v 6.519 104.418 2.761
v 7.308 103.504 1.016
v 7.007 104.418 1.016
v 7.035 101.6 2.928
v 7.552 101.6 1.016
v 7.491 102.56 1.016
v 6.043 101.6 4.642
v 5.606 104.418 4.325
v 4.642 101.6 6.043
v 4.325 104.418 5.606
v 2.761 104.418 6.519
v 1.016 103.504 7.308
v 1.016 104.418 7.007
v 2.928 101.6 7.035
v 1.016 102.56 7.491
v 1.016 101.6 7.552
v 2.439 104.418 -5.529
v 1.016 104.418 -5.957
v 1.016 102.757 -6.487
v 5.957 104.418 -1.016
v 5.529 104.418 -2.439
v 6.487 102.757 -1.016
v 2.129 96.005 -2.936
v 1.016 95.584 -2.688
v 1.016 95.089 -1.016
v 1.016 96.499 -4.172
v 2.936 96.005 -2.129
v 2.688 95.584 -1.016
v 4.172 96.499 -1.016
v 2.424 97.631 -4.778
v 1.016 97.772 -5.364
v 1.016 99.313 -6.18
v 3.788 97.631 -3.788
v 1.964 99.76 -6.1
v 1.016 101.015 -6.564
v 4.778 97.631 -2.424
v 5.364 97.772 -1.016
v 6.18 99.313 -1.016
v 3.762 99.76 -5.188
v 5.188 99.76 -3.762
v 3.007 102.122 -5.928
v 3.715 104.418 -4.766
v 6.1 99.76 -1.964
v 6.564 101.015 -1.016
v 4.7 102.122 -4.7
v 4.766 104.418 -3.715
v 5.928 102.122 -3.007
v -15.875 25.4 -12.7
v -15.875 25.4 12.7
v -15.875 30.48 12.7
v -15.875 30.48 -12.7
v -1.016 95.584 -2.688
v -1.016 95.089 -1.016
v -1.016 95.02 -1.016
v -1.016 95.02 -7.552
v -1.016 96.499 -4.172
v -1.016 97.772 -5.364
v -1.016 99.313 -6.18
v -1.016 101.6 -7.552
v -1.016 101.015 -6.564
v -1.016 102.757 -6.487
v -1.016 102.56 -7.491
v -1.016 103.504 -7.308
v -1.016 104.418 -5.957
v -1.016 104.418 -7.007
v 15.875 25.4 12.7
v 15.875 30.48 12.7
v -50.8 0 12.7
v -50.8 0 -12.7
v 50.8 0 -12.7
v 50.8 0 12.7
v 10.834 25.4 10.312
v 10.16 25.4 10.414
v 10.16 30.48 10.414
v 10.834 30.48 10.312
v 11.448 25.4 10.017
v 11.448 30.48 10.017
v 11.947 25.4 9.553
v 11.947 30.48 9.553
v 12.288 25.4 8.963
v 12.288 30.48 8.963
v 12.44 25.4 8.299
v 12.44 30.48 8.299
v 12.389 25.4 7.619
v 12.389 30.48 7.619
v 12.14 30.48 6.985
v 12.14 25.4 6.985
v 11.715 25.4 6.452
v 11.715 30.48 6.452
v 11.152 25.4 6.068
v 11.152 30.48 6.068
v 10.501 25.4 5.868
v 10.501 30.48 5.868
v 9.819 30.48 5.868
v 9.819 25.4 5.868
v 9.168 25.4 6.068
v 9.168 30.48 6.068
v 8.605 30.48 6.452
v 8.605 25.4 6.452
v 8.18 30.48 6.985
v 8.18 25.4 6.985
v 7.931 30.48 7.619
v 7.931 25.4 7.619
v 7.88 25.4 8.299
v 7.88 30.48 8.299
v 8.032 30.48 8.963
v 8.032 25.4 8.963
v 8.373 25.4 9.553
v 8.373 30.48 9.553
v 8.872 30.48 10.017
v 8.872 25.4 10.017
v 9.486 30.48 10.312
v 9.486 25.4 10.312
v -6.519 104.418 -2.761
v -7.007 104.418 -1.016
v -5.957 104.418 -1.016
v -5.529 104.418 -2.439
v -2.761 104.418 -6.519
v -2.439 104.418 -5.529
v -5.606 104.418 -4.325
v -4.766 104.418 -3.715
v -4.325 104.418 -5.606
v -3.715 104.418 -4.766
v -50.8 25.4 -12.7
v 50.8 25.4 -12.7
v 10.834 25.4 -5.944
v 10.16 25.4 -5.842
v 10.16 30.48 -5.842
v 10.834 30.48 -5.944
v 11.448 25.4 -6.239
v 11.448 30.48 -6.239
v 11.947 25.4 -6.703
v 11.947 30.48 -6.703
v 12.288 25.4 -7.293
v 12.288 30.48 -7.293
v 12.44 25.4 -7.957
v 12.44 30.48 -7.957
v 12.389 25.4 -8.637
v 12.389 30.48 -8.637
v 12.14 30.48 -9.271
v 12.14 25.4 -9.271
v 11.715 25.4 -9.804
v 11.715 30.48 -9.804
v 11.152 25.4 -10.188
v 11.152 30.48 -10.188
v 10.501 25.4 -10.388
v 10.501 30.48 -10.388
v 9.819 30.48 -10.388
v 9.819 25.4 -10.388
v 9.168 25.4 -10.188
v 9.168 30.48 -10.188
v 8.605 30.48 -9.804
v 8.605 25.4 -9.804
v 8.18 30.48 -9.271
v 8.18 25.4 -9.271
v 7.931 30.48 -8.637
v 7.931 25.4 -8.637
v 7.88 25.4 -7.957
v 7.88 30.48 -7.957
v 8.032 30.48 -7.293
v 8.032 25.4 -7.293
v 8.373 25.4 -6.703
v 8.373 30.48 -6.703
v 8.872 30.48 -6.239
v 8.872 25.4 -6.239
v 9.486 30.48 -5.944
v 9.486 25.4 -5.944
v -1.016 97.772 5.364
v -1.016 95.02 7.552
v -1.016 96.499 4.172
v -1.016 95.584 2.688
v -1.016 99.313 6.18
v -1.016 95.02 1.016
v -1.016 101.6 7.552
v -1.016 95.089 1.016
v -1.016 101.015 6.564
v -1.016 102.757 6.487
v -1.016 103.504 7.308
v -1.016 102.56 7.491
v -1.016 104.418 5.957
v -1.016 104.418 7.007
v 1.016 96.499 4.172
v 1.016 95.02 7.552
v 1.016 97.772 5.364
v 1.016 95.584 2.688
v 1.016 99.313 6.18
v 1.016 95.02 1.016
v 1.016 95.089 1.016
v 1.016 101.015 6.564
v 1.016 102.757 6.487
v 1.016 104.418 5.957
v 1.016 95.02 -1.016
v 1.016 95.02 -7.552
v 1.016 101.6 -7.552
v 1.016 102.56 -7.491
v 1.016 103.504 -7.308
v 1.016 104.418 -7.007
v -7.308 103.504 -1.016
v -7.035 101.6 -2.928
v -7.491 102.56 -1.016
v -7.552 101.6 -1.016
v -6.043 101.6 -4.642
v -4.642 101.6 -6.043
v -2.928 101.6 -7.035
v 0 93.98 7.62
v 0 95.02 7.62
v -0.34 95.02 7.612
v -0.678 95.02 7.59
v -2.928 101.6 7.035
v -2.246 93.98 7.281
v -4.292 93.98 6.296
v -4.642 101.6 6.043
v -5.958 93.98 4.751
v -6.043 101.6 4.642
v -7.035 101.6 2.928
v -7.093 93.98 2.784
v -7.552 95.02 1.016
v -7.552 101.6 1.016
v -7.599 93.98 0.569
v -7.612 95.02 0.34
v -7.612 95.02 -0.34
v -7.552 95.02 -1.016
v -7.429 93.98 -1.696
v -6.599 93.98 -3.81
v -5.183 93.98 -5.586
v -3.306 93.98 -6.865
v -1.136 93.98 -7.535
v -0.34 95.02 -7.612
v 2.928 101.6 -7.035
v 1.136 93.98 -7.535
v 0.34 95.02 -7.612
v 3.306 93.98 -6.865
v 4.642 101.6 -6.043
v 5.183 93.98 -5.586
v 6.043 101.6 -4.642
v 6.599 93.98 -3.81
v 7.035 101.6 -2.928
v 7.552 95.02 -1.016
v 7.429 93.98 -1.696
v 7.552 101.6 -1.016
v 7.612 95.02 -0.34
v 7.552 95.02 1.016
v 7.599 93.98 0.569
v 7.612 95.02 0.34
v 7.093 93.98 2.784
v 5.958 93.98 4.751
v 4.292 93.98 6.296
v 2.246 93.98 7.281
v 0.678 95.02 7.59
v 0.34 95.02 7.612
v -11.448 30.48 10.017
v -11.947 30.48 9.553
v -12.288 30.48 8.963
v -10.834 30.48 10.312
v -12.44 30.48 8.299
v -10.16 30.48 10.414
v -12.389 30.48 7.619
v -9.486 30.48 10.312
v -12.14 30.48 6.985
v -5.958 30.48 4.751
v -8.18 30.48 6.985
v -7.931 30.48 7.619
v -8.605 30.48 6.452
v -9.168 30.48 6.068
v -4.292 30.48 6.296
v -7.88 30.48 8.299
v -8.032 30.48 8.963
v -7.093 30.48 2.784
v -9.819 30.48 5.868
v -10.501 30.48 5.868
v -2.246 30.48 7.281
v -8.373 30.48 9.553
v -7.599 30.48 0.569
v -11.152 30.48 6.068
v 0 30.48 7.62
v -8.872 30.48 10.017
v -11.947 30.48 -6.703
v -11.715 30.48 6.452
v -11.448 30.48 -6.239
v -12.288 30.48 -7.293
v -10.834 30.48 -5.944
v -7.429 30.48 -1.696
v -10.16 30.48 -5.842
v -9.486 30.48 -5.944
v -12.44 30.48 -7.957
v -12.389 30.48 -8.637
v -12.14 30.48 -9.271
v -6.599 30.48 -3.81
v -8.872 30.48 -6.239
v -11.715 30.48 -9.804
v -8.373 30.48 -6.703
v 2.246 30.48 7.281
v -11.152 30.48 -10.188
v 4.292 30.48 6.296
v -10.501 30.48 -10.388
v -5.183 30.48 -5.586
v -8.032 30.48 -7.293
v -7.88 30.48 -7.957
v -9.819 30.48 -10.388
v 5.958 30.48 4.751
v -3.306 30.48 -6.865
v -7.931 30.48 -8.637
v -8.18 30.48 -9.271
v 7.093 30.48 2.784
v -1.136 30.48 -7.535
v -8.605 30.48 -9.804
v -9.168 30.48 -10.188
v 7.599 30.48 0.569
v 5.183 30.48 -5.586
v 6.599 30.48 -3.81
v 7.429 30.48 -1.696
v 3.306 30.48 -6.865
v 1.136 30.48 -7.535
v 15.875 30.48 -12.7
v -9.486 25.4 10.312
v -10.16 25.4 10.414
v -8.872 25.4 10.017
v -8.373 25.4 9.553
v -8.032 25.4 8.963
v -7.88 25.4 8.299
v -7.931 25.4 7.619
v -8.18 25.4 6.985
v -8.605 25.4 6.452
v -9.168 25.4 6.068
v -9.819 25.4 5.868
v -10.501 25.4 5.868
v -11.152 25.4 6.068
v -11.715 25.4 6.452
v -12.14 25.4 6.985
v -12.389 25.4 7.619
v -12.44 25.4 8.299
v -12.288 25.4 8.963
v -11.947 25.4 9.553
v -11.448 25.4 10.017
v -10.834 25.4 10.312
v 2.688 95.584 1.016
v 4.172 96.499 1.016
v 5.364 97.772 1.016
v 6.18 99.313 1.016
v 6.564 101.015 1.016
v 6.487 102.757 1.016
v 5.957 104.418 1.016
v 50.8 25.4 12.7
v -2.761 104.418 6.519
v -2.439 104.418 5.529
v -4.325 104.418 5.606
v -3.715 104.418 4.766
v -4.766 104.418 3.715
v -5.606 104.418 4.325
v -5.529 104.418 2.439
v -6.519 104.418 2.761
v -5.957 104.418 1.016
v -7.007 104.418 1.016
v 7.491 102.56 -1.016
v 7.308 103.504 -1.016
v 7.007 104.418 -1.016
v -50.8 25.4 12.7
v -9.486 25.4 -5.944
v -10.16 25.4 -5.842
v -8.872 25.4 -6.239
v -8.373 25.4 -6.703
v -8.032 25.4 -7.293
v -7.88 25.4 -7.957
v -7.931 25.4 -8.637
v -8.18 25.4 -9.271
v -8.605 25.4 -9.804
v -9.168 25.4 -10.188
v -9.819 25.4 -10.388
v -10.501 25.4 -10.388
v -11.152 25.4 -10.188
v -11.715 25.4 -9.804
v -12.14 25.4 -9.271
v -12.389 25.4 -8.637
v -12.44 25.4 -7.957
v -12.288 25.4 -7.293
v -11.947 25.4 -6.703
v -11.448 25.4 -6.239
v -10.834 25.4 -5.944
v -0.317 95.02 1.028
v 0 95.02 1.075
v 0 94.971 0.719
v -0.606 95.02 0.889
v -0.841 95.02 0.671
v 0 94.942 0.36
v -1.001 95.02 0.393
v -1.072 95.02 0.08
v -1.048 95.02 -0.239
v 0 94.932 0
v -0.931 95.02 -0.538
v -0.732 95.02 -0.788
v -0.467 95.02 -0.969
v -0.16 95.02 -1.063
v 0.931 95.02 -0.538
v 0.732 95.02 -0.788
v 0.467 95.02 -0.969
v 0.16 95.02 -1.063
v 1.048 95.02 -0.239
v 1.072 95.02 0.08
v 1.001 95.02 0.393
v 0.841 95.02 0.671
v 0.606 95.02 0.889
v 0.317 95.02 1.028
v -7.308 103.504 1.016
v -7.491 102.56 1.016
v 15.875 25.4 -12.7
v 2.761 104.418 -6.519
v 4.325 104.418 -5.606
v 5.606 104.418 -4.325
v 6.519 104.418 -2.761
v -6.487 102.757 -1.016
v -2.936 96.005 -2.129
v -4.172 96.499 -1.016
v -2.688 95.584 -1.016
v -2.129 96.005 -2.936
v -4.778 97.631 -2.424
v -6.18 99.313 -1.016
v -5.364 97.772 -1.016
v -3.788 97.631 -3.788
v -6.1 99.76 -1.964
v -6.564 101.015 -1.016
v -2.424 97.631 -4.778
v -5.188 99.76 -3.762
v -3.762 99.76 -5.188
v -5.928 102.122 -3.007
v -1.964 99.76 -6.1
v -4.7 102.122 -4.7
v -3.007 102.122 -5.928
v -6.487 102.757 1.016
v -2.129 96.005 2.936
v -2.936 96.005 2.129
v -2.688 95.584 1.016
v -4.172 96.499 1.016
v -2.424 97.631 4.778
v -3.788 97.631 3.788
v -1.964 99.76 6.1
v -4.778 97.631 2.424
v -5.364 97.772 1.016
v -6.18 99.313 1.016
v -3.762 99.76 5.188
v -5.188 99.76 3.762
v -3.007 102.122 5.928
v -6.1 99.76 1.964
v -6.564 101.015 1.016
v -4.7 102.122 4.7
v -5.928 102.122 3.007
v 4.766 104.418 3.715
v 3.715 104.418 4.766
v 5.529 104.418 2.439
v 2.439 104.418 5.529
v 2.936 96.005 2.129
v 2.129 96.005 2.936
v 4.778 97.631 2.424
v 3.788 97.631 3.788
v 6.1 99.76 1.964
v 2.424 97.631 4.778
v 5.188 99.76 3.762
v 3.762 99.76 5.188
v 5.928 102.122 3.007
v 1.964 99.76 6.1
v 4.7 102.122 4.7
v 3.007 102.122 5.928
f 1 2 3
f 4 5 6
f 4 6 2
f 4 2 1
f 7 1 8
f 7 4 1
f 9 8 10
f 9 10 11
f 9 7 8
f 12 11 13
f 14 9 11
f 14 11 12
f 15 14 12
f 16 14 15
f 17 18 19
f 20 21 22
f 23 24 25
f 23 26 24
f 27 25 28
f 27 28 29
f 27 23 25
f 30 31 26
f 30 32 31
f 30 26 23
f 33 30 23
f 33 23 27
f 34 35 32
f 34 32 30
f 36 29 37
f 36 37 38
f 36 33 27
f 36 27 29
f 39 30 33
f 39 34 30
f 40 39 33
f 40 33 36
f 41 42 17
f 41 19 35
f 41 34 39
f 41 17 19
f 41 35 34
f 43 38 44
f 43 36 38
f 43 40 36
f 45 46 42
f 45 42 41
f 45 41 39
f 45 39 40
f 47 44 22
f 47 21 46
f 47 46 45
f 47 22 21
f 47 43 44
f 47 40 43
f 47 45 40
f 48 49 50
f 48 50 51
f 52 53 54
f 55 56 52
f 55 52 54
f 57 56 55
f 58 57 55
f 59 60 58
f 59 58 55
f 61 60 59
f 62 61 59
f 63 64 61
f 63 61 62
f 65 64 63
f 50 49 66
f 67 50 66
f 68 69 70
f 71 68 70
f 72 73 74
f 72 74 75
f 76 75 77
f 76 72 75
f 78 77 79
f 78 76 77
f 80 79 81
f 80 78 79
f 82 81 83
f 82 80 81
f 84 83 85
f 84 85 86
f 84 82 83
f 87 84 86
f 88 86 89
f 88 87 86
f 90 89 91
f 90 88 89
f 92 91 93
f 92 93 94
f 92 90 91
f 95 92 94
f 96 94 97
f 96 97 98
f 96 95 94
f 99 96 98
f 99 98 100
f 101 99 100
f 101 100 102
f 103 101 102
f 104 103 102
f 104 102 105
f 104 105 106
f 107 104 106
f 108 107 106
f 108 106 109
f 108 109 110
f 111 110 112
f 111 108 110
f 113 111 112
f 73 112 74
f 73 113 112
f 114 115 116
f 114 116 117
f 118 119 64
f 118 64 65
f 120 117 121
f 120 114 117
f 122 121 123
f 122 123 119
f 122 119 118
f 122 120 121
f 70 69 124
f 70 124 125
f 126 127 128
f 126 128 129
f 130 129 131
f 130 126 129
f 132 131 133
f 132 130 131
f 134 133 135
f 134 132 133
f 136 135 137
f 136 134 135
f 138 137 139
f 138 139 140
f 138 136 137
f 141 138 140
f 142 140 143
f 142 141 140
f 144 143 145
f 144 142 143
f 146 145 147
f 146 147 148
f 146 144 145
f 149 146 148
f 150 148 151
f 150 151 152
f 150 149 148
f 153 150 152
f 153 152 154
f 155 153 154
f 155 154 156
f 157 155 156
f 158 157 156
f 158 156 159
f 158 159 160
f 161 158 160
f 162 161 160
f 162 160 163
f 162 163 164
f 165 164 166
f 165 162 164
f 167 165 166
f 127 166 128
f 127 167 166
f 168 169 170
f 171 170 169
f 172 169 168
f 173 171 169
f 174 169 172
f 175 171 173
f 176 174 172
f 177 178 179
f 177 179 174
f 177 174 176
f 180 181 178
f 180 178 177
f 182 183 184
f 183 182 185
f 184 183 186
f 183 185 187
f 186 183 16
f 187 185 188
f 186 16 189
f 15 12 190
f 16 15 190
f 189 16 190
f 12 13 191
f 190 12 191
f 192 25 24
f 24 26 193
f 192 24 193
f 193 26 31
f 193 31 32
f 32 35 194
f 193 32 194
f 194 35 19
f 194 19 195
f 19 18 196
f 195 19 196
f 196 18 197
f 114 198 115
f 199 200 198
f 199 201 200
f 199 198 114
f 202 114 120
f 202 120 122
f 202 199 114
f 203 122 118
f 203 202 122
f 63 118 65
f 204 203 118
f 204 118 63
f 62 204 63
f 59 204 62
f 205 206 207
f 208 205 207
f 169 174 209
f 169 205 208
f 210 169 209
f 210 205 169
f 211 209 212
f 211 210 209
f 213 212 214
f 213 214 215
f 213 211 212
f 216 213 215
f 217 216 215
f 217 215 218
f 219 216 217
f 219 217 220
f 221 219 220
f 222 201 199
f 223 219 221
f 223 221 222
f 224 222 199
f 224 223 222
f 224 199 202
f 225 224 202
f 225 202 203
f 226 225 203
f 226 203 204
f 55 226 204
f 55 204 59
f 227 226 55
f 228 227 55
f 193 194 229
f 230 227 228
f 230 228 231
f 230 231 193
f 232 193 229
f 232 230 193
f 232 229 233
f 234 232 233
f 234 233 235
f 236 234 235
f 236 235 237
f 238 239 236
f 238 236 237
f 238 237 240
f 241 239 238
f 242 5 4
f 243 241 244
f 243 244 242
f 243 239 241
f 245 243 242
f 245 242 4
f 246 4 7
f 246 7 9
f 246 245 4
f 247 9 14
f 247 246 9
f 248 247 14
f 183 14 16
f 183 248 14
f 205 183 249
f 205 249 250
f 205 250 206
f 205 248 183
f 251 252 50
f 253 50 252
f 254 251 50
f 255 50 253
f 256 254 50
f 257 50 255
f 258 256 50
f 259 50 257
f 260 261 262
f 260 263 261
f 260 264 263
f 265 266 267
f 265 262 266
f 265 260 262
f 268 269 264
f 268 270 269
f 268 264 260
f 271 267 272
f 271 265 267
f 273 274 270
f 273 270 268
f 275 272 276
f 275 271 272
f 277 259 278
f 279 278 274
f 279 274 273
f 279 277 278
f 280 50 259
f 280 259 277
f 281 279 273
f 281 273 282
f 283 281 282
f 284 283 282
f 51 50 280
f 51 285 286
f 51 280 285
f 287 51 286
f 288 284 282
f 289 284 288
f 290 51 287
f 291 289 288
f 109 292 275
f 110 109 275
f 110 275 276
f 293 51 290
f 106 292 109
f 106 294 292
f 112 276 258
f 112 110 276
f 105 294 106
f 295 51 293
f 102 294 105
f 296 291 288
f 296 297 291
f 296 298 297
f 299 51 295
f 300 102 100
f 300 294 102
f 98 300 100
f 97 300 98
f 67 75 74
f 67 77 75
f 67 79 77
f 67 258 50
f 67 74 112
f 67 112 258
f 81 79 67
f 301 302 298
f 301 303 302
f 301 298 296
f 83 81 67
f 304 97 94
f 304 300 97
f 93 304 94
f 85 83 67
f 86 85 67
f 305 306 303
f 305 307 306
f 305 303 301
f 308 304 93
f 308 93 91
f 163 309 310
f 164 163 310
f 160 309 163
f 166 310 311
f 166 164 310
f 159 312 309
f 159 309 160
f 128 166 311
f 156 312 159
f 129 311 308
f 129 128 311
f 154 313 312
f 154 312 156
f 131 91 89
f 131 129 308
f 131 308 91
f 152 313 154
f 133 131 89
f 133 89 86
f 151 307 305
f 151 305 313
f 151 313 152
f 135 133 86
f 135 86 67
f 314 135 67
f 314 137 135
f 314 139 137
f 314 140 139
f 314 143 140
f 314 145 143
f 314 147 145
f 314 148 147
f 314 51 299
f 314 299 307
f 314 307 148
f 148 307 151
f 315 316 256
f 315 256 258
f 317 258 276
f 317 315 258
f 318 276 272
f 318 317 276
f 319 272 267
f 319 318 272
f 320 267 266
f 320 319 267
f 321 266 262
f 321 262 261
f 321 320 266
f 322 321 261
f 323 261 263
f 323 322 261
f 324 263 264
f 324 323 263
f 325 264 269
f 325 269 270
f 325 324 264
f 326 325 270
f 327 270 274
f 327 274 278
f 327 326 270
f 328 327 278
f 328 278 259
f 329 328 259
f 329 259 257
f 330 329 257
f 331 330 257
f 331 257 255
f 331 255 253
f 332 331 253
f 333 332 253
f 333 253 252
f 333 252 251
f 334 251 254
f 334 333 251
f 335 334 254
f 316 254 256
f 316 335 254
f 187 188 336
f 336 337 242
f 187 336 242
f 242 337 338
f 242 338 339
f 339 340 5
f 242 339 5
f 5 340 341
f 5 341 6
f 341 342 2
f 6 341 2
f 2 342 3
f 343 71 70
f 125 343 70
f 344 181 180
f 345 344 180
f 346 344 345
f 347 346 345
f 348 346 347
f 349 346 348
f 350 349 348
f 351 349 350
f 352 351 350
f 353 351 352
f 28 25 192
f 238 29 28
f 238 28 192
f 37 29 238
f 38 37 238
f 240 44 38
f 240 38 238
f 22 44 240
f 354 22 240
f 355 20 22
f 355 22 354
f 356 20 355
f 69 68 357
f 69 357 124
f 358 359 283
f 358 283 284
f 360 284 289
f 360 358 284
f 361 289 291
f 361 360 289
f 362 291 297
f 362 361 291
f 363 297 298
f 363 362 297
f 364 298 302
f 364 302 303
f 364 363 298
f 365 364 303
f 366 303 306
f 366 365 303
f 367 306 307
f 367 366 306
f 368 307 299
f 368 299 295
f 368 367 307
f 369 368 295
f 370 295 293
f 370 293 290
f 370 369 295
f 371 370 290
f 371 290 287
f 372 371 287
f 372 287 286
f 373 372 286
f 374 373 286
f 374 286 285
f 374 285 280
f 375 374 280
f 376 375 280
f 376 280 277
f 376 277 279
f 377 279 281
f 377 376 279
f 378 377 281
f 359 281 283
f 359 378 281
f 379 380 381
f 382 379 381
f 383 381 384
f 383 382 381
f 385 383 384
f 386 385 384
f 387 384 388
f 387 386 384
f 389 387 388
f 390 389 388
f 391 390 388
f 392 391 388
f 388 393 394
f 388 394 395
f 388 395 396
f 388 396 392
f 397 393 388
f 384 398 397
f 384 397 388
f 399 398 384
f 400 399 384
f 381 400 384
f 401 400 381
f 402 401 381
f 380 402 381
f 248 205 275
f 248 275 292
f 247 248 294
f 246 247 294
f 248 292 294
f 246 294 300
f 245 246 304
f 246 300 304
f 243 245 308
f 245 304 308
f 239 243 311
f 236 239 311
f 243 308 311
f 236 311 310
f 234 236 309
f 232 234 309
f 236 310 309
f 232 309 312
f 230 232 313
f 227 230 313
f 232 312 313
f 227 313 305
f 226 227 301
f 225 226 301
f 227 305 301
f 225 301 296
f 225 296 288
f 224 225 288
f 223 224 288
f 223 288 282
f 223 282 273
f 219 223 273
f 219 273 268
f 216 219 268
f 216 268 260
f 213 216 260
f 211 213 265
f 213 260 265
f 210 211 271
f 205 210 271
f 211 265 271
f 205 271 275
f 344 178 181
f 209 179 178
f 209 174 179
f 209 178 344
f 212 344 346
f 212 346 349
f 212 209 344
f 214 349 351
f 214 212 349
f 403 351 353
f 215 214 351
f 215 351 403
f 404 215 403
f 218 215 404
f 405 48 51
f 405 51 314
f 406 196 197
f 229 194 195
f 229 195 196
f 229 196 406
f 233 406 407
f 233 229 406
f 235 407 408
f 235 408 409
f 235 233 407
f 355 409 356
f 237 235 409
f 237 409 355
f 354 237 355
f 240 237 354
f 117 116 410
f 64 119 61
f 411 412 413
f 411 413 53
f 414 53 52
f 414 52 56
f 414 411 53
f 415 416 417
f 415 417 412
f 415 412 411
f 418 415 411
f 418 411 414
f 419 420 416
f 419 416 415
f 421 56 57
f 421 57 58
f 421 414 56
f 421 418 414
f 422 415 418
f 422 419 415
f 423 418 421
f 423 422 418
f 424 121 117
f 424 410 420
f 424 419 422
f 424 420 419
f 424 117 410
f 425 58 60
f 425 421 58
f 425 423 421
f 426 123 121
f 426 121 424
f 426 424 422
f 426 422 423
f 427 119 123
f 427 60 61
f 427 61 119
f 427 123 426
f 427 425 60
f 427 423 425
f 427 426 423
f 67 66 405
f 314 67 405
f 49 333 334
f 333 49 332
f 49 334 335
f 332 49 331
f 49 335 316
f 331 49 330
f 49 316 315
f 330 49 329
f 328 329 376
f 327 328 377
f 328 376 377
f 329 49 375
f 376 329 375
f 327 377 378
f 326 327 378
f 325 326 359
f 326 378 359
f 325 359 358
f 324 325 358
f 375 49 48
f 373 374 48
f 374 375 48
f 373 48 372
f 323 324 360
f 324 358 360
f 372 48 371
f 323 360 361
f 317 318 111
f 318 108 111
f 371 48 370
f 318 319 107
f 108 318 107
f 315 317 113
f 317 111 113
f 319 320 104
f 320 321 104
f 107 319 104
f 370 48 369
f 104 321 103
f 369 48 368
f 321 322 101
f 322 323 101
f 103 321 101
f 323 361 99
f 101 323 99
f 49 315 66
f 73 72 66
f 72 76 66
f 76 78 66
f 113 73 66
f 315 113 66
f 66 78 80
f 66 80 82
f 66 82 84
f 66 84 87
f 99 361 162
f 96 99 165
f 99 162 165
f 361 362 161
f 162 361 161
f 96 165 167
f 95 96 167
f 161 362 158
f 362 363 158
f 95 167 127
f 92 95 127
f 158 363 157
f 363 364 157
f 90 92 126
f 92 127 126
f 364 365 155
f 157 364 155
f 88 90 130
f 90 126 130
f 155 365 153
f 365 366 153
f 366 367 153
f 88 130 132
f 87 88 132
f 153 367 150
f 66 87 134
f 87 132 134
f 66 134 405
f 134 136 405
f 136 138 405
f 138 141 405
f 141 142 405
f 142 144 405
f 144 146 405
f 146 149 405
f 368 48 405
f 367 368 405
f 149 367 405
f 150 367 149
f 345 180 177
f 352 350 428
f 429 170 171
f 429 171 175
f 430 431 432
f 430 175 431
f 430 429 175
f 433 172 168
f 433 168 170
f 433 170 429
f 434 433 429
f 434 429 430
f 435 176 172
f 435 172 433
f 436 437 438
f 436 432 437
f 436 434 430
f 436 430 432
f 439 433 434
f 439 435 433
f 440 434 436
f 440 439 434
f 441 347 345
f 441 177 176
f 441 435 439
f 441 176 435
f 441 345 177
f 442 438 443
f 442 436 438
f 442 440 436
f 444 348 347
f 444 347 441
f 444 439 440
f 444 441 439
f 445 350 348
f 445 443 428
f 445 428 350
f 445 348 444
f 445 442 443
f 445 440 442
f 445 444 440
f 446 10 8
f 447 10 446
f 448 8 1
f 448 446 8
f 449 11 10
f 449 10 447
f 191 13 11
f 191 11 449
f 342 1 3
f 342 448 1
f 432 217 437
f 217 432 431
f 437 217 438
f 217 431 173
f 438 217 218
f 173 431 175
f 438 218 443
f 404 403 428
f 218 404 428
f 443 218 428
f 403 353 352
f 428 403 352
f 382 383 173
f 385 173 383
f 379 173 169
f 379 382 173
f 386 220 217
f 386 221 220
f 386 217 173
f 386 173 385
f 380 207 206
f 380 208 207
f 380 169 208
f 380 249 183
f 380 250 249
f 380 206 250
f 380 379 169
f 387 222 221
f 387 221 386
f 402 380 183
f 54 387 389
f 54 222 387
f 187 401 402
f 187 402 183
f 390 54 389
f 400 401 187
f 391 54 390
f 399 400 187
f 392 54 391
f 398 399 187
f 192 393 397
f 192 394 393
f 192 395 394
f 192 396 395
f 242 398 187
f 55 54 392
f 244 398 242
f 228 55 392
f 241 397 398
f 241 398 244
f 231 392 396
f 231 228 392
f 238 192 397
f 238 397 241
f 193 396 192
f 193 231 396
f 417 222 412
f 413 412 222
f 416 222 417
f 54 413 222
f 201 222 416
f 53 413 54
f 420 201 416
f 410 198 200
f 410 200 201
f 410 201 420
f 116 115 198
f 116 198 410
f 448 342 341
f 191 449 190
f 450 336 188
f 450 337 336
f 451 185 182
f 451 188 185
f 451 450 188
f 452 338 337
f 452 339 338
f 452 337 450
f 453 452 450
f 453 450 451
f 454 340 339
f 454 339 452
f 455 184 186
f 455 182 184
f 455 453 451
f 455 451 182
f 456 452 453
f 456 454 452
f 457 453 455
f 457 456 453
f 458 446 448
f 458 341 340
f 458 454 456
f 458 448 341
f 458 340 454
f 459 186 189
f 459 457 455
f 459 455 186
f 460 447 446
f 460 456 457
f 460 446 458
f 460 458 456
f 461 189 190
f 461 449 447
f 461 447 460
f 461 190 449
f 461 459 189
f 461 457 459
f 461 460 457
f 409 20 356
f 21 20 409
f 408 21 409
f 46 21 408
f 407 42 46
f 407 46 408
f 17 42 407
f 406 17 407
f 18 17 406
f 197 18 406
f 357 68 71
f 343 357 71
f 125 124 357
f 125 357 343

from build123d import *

# Parameters (mm, degrees)
SKETCH1_W           = 101.6
SKETCH1_H           = 25.4
BOSS_EXTRUDE1_DEPTH = 25.4
SKETCH2_W           = 31.75
SKETCH2_H           = 25.4
SKETCH2_R           = 2.286
BOSS_EXTRUDE2_DEPTH = 5.08
SKETCH3_R           = 7.62
BOSS_EXTRUDE3_DEPTH = 63.5
SKETCH5_W           = 2.032
SKETCH5_H           = 7.874
SKETCH5_W_2         = 7.874
SKETCH5_H_2         = 2.032
CUT_EXTRUDE2_DEPTH  = 9.398


with BuildPart() as part:
    # Sketch1 → Boss-Extrude1 (new body)
    with BuildSketch(Plane(origin=(0, 0, 0), x_dir=(1, 0, 0), z_dir=(0, 1, 0))):
        Rectangle(SKETCH1_W, SKETCH1_H)
    extrude(amount=BOSS_EXTRUDE1_DEPTH)


with BuildPart() as body_2:
    # Sketch2 → Boss-Extrude2 (new body)
    with BuildSketch(Plane(origin=(0, 25.4, 0), x_dir=(1, 0, 0), z_dir=(0, 1, 0))):
        Rectangle(SKETCH2_W, SKETCH2_H)
        with Locations(Location((10.16, -8.128, 0), (0, 0, 270))):
            Circle(SKETCH2_R, mode=Mode.SUBTRACT)
        with Locations(Location((-10.16, -8.128, 0), (0, 0, 270))):
            Circle(SKETCH2_R, mode=Mode.SUBTRACT)
        with Locations(Location((-10.16, 8.128, 0), (0, 0, 270))):
            Circle(SKETCH2_R, mode=Mode.SUBTRACT)
        with Locations(Location((10.16, 8.128, 0), (0, 0, 270))):
            Circle(SKETCH2_R, mode=Mode.SUBTRACT)
    extrude(amount=BOSS_EXTRUDE2_DEPTH)

    # Sketch3 → Boss-Extrude3 (add)
    with BuildSketch(Plane(origin=(0, 30.48, 0), x_dir=(1, 0, 0), z_dir=(0, 1, 0))):
        with Locations(Location((0, 0, 0), (0, 0, 270))):
            Circle(SKETCH3_R)
    extrude(amount=BOSS_EXTRUDE3_DEPTH)

    # Sketch4 → Revolve1 (revolve)
    with BuildSketch(Plane.XY, mode=Mode.PRIVATE) as revolve1_sk:
        with BuildLine():
            Line((-7.62, 93.98), (0, 93.98))
            Line((0, 93.98), (0, 94.9325))
            ThreePointArc((0, 94.9325), (-5.623312465, 98.017554861), (-6.04280717, 104.41780726))
            Line((-6.04280717, 104.41780726), (-7.079856089, 104.41780726))
            ThreePointArc((-7.079856089, 104.41780726), (-7.483745833, 103.034555088), (-7.62, 101.6))
            Line((-7.62, 101.6), (-7.62, 93.98))
        make_face()
    revolve(revolve1_sk.sketch.rotate(Axis((0, 93.98, 0), (0, -1, 0)), 270), axis=Axis((0, 93.98, 0), (0, -1, 0)))

    # Sketch5 → Cut-Extrude2 (cut)
    with BuildSketch(Plane(origin=(0, 104.41780726, 0), x_dir=(1, 0, 0), z_dir=(0, 1, 0))):
        with Locations((0, -4.953)):
            Rectangle(SKETCH5_W, SKETCH5_H)
        with Locations((0, 4.953)):
            Rectangle(SKETCH5_W, SKETCH5_H)
        with Locations((4.953, 0)):
            Rectangle(SKETCH5_W_2, SKETCH5_H_2)
        with Locations((-4.953, 0)):
            Rectangle(SKETCH5_W_2, SKETCH5_H_2)
        Rectangle(SKETCH5_W, SKETCH5_H_2)
    extrude(amount=-CUT_EXTRUDE2_DEPTH, mode=Mode.SUBTRACT)


solid = Compound([part.part, body_2.part])
